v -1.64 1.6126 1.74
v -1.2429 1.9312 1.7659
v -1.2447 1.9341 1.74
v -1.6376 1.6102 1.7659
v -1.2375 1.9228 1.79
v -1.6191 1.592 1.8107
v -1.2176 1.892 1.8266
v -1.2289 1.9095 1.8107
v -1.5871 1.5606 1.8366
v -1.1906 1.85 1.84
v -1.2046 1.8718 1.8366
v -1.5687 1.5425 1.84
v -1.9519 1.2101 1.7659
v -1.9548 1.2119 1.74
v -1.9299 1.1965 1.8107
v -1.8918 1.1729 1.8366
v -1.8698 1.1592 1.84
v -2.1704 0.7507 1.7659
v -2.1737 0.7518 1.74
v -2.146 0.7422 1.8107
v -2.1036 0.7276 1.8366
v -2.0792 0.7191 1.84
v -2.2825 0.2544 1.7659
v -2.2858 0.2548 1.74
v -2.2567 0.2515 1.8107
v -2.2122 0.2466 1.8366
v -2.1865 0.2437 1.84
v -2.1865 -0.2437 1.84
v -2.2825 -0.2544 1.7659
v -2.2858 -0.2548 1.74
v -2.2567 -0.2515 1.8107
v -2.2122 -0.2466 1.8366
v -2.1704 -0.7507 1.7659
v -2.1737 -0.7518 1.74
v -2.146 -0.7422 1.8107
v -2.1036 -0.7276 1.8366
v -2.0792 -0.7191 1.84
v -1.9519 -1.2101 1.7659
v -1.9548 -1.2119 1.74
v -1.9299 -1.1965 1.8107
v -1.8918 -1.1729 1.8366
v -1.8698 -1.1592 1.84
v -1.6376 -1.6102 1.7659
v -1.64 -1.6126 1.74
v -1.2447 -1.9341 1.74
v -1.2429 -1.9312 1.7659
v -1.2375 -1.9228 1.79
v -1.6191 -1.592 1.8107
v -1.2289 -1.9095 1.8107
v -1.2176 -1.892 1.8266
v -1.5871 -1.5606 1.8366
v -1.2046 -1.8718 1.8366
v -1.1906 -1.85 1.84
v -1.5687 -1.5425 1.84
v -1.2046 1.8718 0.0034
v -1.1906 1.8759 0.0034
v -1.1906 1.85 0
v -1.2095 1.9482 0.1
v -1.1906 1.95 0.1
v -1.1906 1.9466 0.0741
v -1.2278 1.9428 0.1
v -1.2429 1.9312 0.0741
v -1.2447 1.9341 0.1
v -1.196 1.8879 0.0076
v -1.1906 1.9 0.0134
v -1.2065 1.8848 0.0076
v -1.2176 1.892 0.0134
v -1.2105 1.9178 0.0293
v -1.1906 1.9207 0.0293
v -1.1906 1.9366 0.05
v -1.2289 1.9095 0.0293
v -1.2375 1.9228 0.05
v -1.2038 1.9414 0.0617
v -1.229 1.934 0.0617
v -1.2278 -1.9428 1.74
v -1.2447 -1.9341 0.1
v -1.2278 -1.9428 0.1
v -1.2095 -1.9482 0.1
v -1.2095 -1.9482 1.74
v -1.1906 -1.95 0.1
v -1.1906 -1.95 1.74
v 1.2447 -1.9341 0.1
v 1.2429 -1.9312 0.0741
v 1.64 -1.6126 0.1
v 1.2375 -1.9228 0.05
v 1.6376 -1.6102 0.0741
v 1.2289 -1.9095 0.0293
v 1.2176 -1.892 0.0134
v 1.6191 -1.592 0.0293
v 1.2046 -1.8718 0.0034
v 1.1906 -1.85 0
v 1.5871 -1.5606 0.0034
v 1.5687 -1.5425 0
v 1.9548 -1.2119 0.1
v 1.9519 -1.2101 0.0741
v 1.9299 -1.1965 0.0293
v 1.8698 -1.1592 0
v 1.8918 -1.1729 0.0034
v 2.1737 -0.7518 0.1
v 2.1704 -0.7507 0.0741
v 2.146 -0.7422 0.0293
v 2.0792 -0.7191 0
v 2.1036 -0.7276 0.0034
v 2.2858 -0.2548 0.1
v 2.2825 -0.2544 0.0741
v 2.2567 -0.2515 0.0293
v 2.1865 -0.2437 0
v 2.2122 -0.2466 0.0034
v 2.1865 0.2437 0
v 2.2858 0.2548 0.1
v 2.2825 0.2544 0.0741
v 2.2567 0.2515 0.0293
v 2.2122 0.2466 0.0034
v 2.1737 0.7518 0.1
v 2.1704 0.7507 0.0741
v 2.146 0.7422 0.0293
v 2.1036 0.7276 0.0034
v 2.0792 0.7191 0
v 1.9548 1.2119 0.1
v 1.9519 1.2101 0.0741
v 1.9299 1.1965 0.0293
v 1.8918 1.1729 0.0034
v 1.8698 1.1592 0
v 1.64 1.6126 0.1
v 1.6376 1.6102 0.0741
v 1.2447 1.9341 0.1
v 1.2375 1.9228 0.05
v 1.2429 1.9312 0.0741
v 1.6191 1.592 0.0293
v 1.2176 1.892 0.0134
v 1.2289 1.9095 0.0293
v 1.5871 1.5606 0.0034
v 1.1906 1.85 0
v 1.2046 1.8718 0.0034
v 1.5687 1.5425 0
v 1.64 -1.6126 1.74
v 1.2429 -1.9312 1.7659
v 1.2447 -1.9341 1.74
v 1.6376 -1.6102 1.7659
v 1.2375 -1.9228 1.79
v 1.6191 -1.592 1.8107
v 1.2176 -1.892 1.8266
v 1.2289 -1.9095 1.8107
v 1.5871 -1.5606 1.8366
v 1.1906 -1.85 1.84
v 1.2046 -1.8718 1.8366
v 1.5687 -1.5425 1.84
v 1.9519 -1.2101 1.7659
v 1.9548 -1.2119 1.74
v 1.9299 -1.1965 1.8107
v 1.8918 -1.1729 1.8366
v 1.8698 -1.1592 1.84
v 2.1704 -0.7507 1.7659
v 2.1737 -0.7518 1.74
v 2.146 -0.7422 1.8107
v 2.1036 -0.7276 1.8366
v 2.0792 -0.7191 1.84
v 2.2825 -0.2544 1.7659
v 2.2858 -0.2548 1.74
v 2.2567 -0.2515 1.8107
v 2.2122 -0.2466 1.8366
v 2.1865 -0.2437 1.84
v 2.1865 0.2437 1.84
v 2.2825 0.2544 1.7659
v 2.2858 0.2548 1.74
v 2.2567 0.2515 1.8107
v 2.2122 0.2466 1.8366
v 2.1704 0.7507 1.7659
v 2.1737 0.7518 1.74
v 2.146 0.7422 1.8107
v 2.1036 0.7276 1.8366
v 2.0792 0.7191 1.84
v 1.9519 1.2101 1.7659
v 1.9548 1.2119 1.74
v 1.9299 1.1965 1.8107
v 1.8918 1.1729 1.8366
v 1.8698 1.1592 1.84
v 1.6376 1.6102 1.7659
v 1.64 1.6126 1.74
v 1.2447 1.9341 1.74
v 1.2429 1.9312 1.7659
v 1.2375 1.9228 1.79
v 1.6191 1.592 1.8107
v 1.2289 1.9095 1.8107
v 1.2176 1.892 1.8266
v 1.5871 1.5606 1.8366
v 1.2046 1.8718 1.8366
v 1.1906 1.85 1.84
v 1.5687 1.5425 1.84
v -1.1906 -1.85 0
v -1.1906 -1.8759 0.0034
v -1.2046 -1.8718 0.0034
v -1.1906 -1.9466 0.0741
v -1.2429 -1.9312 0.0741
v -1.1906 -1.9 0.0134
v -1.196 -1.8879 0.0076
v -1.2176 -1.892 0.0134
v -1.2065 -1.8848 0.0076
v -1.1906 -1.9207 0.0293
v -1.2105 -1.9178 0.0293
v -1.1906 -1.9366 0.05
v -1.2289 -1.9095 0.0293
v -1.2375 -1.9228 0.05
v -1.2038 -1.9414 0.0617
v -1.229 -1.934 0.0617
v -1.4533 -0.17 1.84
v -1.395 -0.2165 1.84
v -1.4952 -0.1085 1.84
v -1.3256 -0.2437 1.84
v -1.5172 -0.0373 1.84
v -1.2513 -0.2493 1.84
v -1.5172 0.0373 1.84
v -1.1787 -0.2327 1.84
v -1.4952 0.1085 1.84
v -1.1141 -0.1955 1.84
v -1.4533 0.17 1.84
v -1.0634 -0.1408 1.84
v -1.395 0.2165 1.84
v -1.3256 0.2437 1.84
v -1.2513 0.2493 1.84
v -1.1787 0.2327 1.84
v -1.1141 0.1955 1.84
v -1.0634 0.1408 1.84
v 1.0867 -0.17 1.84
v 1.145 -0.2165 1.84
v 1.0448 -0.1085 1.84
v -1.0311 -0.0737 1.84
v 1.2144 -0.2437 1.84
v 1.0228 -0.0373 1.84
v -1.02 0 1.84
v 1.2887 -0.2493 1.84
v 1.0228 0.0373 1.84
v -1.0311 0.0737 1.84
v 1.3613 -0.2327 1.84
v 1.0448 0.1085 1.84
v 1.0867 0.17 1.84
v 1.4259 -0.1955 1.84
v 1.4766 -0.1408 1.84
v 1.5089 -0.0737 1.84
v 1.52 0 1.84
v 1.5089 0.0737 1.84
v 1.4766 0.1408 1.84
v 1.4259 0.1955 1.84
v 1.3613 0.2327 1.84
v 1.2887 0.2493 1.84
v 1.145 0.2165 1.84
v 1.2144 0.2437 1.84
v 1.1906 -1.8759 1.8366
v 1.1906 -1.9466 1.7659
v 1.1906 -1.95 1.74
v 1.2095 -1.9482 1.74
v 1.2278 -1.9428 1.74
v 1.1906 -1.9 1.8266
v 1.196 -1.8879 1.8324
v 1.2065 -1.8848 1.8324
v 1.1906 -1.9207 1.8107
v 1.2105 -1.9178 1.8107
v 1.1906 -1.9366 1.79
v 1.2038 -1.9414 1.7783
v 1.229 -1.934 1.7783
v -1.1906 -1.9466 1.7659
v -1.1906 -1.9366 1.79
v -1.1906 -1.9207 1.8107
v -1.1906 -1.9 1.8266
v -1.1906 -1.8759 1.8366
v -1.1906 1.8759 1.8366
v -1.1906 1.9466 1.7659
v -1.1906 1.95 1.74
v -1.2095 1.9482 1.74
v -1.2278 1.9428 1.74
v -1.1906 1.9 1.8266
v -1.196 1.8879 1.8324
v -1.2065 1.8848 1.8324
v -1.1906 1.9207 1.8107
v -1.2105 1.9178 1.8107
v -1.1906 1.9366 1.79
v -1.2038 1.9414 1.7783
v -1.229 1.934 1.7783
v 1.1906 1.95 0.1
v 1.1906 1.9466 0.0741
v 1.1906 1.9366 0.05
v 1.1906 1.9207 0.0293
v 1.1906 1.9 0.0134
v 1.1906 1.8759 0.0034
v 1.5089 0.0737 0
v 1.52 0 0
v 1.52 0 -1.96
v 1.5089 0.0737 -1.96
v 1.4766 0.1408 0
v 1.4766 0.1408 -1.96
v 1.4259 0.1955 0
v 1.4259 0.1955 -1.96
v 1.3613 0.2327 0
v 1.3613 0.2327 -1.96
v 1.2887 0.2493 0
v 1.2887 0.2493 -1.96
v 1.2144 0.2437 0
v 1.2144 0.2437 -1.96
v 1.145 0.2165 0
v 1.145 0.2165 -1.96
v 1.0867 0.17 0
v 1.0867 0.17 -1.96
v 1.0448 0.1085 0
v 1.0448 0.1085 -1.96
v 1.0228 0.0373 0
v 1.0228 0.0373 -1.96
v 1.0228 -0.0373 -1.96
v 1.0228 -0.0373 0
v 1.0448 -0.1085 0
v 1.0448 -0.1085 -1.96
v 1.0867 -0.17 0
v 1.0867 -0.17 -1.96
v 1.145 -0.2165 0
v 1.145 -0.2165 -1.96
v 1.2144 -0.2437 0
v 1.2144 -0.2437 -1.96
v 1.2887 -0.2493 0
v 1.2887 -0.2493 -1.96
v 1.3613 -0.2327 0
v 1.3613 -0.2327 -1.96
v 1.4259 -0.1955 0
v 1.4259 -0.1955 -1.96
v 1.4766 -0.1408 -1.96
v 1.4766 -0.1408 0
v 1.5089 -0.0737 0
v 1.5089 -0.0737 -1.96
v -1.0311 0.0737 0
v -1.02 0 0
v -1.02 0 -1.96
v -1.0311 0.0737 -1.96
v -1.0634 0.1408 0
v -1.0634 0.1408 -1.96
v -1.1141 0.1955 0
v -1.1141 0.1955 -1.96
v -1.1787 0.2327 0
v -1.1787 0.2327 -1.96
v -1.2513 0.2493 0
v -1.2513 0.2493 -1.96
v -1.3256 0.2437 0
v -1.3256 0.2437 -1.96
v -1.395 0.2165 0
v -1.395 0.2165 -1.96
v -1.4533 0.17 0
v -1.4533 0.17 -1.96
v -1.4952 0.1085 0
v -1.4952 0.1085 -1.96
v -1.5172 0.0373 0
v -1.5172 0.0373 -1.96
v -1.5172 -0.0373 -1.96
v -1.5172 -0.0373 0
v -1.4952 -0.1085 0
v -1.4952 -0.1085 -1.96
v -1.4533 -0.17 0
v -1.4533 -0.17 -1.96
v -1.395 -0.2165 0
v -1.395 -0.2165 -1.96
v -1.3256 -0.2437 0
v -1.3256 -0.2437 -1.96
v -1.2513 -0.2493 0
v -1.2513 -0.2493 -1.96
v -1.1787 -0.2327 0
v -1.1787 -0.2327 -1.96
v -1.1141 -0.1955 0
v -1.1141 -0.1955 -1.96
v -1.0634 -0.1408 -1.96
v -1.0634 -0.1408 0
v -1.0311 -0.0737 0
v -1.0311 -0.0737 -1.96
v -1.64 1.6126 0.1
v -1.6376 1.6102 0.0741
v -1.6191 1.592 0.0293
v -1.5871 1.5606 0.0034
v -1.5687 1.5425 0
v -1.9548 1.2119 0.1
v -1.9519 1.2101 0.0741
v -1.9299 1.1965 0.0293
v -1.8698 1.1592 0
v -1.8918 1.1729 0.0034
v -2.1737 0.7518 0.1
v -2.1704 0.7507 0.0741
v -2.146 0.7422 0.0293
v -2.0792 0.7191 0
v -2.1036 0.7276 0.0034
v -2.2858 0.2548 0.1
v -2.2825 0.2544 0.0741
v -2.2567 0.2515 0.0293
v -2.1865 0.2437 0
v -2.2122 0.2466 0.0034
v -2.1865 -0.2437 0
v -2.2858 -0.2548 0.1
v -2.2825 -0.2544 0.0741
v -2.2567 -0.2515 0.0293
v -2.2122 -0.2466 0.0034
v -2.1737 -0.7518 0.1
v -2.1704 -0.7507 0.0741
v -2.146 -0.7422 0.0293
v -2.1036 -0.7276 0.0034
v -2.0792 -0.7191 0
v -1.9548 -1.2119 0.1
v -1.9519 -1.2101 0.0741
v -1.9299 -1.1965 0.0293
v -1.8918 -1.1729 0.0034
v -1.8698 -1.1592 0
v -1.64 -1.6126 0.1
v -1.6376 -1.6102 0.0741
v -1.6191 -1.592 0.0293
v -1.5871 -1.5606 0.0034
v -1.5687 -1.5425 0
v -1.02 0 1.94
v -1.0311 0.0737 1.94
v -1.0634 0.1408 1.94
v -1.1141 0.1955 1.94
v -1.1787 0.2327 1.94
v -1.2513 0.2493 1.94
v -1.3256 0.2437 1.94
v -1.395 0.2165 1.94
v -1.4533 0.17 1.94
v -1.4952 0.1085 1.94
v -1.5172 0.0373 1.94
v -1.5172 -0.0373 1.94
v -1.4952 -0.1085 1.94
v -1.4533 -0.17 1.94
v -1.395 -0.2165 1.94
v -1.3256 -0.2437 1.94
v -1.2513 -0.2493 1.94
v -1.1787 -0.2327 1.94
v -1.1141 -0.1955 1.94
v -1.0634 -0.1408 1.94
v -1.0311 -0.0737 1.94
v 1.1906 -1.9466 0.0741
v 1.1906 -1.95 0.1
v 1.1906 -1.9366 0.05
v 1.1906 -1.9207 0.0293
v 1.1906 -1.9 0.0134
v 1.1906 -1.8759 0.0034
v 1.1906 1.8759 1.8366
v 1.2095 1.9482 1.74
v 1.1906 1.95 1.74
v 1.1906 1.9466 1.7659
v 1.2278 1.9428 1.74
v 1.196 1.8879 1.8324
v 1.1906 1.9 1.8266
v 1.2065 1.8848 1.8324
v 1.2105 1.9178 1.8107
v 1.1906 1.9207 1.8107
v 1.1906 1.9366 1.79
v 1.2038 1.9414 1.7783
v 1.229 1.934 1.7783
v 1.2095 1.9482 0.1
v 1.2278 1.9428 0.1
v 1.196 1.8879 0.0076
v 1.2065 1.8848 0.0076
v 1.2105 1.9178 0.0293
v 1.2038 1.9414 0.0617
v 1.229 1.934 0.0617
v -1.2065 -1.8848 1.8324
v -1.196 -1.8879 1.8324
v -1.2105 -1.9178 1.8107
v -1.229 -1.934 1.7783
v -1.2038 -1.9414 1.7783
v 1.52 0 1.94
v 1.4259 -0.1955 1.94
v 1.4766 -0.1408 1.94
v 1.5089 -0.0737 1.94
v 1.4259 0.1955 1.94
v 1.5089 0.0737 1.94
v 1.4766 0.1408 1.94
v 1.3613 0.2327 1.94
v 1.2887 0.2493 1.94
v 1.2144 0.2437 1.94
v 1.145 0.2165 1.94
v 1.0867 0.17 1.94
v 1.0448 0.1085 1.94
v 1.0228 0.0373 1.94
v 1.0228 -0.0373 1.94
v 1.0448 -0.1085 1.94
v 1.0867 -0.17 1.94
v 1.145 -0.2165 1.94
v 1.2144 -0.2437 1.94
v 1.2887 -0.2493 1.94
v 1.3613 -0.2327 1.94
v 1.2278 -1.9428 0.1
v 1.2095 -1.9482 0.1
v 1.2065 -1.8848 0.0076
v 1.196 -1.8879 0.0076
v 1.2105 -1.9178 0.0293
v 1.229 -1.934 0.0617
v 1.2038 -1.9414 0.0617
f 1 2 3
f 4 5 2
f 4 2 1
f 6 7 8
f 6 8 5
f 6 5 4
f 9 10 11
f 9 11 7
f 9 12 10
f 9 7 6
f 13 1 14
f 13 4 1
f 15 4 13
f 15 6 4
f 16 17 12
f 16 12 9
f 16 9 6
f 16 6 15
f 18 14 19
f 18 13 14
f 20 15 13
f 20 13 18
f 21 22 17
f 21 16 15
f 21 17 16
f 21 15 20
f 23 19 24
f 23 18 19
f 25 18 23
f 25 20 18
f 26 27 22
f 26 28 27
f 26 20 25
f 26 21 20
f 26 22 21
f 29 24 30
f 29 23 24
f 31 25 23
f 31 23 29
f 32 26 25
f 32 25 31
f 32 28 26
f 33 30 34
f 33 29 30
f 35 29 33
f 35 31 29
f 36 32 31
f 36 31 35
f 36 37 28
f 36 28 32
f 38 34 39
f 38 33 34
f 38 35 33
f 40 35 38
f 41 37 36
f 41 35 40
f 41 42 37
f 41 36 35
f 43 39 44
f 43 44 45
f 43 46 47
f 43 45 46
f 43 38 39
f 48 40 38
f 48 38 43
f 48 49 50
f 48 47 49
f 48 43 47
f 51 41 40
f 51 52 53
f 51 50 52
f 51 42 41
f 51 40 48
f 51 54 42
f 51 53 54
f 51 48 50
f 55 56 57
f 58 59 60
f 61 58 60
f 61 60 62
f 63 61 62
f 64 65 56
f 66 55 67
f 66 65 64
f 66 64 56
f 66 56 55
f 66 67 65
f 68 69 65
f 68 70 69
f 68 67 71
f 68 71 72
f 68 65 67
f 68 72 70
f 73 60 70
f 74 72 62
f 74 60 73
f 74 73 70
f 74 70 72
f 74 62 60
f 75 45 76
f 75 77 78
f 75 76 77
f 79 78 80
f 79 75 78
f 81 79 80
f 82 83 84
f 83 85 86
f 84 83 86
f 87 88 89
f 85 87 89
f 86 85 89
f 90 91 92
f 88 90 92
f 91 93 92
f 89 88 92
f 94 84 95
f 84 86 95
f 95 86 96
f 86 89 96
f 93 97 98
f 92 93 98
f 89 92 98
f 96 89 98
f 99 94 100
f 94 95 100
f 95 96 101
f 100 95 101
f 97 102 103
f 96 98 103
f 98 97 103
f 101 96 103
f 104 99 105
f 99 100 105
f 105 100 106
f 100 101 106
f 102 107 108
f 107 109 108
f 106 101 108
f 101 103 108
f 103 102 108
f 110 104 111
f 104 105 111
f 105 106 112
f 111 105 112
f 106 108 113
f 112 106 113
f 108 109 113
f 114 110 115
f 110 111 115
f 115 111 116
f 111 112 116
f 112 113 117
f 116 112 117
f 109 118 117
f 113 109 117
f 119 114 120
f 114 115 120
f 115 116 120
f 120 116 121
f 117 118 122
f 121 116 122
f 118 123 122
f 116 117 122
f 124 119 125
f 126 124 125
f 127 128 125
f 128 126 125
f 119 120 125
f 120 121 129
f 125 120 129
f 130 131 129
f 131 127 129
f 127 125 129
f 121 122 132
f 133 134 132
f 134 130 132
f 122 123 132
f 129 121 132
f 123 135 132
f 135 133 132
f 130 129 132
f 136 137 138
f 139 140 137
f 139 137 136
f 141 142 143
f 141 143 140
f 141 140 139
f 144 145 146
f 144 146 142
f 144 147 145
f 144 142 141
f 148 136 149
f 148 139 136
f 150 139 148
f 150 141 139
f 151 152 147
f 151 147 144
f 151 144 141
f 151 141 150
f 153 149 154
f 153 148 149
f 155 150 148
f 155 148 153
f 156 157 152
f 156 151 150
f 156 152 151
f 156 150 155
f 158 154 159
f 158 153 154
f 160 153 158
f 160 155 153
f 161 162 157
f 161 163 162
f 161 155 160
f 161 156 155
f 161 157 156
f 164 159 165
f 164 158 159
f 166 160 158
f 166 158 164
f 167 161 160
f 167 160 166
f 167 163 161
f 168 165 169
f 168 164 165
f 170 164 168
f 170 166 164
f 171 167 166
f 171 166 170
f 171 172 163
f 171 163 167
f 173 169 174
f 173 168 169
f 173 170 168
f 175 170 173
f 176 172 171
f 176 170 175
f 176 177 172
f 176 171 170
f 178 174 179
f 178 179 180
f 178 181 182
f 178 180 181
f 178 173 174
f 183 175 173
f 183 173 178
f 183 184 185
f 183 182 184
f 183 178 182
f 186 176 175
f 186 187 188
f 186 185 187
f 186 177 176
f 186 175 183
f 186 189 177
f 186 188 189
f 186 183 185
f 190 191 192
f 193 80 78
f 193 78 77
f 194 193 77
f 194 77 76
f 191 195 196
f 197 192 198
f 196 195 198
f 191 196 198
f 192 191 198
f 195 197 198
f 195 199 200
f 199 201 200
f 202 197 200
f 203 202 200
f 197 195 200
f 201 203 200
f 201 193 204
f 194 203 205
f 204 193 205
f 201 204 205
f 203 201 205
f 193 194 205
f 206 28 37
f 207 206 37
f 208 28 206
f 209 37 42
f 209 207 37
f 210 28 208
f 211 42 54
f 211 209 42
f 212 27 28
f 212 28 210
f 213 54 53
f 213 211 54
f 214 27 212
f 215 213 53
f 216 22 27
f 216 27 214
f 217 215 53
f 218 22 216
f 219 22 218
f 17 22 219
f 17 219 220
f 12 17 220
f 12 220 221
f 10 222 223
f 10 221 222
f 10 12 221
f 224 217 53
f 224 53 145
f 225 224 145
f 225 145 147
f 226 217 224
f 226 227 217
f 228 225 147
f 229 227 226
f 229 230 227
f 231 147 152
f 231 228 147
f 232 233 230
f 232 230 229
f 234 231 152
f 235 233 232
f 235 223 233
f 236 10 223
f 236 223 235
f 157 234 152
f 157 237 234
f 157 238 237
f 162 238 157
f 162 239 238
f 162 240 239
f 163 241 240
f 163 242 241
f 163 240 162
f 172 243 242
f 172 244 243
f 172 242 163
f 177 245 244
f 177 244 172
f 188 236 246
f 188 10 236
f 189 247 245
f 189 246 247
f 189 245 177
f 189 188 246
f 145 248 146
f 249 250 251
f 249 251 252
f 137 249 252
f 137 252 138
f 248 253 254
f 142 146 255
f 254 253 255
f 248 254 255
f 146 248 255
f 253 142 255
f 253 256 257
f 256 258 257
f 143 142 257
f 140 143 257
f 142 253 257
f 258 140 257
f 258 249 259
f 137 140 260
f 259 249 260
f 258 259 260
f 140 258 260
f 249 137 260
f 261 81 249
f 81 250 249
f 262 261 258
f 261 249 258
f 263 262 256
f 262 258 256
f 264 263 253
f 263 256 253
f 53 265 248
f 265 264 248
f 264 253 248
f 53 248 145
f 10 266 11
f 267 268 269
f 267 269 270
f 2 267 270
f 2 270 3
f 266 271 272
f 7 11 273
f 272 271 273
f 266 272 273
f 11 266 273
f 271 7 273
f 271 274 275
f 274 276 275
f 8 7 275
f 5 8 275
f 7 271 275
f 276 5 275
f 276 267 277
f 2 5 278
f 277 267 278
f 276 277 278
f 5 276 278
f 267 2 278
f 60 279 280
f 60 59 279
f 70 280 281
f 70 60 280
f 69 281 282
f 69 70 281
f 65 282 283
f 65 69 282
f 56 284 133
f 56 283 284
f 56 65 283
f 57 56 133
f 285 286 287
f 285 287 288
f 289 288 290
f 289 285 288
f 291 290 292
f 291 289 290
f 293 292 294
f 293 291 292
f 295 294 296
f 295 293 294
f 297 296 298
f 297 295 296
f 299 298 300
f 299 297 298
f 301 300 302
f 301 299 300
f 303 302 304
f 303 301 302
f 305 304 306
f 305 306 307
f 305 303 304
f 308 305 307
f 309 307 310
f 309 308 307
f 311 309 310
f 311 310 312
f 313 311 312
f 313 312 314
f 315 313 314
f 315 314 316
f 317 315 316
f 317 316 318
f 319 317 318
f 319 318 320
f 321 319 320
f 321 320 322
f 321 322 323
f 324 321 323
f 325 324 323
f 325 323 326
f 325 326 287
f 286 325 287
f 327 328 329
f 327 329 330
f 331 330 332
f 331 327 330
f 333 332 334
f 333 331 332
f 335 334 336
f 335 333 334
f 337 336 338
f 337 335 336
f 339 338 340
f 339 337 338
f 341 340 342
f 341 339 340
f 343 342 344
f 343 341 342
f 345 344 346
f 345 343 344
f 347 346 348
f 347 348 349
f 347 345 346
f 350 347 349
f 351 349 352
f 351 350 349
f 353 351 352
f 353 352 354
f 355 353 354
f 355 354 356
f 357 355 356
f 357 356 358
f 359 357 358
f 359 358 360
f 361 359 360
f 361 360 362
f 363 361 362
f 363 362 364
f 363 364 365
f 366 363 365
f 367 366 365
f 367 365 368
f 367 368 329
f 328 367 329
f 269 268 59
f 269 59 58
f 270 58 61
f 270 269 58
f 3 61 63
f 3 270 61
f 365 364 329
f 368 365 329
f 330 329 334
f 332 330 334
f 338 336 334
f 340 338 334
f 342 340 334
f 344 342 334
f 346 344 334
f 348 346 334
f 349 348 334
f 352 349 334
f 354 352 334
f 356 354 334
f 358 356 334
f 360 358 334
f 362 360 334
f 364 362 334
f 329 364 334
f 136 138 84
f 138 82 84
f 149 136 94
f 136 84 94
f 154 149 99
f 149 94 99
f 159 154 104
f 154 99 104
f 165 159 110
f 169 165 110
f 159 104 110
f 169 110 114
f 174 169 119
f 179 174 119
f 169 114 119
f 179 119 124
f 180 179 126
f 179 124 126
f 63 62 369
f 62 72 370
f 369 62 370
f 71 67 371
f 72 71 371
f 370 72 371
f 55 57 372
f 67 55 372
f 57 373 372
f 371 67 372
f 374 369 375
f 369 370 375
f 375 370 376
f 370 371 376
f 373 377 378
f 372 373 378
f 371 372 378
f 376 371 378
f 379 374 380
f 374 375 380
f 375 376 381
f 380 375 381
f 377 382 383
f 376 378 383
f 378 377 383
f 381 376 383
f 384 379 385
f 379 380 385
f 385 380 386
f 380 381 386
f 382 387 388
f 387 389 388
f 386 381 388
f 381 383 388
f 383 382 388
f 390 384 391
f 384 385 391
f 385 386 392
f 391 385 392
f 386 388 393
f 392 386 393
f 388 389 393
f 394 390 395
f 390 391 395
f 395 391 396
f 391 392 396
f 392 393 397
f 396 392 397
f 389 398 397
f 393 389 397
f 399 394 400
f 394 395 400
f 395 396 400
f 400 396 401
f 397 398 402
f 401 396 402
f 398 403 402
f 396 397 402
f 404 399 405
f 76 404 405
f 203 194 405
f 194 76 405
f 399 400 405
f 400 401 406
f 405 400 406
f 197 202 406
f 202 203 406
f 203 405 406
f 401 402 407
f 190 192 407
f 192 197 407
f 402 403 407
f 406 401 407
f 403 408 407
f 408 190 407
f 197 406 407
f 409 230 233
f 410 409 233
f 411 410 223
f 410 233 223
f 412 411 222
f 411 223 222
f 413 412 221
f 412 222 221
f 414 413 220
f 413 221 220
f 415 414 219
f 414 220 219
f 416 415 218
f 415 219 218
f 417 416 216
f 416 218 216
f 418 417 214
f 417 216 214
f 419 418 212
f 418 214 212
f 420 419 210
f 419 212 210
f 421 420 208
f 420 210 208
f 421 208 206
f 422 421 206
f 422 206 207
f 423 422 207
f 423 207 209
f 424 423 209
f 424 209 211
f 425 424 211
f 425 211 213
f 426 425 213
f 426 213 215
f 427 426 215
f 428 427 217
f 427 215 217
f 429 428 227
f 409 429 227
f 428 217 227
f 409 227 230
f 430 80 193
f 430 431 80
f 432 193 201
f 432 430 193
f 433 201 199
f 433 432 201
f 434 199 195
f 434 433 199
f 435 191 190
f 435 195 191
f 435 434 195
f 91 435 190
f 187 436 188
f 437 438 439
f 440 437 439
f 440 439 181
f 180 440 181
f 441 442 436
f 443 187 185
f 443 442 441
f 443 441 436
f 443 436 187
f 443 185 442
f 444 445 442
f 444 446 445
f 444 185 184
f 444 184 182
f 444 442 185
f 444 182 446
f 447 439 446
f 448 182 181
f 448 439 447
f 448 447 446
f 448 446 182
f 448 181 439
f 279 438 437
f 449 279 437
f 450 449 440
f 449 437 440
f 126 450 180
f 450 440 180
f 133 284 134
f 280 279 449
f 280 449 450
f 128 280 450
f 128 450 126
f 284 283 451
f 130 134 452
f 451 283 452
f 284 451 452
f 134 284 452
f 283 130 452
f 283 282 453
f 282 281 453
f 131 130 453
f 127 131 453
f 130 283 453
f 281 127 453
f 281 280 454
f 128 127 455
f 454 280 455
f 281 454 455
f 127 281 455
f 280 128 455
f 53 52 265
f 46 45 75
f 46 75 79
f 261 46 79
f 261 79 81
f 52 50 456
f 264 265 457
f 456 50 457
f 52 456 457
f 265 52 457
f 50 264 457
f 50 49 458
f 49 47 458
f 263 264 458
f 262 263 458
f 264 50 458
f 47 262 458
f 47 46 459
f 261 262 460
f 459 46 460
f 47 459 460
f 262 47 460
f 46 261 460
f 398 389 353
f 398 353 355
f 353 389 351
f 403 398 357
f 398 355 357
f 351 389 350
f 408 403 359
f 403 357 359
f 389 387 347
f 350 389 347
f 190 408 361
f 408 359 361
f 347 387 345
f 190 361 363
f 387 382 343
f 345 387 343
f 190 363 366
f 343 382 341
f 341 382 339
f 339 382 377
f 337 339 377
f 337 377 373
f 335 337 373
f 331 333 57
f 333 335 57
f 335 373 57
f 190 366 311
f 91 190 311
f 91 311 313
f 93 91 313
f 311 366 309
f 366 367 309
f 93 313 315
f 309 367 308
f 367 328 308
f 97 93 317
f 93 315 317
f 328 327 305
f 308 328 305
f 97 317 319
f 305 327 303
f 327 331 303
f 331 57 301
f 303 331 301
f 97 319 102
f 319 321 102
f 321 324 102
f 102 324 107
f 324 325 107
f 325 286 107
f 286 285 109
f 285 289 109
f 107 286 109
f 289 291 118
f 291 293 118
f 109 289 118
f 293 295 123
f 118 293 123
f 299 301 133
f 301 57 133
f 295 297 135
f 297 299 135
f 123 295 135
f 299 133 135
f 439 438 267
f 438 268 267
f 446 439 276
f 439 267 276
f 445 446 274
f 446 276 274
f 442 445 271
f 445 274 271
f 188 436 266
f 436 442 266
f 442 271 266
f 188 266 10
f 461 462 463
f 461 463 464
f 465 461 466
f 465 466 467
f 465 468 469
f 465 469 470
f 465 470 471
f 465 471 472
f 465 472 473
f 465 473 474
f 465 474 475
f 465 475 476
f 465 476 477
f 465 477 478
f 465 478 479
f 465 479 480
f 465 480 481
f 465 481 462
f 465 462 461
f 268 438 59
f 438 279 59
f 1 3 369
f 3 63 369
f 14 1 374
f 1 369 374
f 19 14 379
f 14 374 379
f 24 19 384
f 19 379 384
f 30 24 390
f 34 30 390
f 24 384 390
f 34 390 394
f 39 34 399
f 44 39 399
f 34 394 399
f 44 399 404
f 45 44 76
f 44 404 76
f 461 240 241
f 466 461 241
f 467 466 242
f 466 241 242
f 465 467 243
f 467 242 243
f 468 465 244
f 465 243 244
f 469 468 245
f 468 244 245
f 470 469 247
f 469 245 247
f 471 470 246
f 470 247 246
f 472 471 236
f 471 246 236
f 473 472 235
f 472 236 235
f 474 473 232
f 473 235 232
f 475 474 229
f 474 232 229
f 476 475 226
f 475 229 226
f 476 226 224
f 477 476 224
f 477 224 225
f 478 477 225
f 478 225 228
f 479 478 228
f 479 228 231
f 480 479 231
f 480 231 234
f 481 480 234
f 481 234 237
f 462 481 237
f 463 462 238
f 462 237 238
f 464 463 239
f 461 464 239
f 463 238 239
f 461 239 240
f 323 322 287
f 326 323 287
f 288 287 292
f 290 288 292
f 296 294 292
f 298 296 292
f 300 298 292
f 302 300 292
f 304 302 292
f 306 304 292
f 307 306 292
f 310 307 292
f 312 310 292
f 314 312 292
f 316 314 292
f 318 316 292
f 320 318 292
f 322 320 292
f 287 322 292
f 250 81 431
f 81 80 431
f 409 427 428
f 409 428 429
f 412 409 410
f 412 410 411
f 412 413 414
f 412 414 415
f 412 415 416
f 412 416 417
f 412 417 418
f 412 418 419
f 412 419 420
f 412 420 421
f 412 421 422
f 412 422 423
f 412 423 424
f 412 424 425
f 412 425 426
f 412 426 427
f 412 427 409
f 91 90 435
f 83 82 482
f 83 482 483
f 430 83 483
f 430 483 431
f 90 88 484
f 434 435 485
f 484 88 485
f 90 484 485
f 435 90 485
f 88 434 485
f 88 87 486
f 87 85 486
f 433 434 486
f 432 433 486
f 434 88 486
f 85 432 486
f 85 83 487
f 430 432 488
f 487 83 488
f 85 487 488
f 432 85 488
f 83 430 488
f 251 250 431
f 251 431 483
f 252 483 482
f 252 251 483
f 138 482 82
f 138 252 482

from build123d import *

# Parameters (mm, degrees)
F1_DEPTH      = 1.84
F2_R          = 0.1
F3_R          = 0.25
F4_DEPTH      = 0.1
F4_DEPTH_BACK = 3.8


with BuildPart() as f1:
    # F0 (on Top) → F1 (new body)
    with BuildSketch(Plane.XY):
        with BuildLine():
            Line((1.219631, 1.95), (-1.219631, 1.95))
            ThreePointArc((-1.219631, 1.95), (-2.3, 0), (-1.219631, -1.95))
            Line((-1.219631, -1.95), (1.219631, -1.95))
            ThreePointArc((1.219631, -1.95), (2.3, 0), (1.219631, 1.95))
        make_face()
    extrude(amount=F1_DEPTH)

    # F2
    f2_edges = [f1.edges().sort_by_distance(p)[0] for p in [
        (0, 1.95, 1.84),
        (-2.3, 0, 1.84),
        (0, -1.95, 1.84),
        (2.3, 0, 1.84),
        (-1.219631, 1.95, 0.92),
        (1.219631, 1.95, 0.92),
        (0, 1.95, 0),
        (-2.3, 0, 0),
        (-1.219631, -1.95, 0.92),
        (1.219631, -1.95, 0.92),
        (2.3, 0, 0),
        (0, -1.95, 0),
    ]]
    fillet(f2_edges, radius=F2_R)

    # F3 (on face) → F4 (join, two sides)
    with BuildSketch(Plane.XY.offset(1.84)) as f4_sk:
        with Locations((-1.27, 0)):
            Circle(F3_R)
        with Locations((1.27, 0)):
            Circle(F3_R)
    extrude(amount=F4_DEPTH)
    extrude(f4_sk.sketch, amount=-F4_DEPTH_BACK)


solid = f1.part
